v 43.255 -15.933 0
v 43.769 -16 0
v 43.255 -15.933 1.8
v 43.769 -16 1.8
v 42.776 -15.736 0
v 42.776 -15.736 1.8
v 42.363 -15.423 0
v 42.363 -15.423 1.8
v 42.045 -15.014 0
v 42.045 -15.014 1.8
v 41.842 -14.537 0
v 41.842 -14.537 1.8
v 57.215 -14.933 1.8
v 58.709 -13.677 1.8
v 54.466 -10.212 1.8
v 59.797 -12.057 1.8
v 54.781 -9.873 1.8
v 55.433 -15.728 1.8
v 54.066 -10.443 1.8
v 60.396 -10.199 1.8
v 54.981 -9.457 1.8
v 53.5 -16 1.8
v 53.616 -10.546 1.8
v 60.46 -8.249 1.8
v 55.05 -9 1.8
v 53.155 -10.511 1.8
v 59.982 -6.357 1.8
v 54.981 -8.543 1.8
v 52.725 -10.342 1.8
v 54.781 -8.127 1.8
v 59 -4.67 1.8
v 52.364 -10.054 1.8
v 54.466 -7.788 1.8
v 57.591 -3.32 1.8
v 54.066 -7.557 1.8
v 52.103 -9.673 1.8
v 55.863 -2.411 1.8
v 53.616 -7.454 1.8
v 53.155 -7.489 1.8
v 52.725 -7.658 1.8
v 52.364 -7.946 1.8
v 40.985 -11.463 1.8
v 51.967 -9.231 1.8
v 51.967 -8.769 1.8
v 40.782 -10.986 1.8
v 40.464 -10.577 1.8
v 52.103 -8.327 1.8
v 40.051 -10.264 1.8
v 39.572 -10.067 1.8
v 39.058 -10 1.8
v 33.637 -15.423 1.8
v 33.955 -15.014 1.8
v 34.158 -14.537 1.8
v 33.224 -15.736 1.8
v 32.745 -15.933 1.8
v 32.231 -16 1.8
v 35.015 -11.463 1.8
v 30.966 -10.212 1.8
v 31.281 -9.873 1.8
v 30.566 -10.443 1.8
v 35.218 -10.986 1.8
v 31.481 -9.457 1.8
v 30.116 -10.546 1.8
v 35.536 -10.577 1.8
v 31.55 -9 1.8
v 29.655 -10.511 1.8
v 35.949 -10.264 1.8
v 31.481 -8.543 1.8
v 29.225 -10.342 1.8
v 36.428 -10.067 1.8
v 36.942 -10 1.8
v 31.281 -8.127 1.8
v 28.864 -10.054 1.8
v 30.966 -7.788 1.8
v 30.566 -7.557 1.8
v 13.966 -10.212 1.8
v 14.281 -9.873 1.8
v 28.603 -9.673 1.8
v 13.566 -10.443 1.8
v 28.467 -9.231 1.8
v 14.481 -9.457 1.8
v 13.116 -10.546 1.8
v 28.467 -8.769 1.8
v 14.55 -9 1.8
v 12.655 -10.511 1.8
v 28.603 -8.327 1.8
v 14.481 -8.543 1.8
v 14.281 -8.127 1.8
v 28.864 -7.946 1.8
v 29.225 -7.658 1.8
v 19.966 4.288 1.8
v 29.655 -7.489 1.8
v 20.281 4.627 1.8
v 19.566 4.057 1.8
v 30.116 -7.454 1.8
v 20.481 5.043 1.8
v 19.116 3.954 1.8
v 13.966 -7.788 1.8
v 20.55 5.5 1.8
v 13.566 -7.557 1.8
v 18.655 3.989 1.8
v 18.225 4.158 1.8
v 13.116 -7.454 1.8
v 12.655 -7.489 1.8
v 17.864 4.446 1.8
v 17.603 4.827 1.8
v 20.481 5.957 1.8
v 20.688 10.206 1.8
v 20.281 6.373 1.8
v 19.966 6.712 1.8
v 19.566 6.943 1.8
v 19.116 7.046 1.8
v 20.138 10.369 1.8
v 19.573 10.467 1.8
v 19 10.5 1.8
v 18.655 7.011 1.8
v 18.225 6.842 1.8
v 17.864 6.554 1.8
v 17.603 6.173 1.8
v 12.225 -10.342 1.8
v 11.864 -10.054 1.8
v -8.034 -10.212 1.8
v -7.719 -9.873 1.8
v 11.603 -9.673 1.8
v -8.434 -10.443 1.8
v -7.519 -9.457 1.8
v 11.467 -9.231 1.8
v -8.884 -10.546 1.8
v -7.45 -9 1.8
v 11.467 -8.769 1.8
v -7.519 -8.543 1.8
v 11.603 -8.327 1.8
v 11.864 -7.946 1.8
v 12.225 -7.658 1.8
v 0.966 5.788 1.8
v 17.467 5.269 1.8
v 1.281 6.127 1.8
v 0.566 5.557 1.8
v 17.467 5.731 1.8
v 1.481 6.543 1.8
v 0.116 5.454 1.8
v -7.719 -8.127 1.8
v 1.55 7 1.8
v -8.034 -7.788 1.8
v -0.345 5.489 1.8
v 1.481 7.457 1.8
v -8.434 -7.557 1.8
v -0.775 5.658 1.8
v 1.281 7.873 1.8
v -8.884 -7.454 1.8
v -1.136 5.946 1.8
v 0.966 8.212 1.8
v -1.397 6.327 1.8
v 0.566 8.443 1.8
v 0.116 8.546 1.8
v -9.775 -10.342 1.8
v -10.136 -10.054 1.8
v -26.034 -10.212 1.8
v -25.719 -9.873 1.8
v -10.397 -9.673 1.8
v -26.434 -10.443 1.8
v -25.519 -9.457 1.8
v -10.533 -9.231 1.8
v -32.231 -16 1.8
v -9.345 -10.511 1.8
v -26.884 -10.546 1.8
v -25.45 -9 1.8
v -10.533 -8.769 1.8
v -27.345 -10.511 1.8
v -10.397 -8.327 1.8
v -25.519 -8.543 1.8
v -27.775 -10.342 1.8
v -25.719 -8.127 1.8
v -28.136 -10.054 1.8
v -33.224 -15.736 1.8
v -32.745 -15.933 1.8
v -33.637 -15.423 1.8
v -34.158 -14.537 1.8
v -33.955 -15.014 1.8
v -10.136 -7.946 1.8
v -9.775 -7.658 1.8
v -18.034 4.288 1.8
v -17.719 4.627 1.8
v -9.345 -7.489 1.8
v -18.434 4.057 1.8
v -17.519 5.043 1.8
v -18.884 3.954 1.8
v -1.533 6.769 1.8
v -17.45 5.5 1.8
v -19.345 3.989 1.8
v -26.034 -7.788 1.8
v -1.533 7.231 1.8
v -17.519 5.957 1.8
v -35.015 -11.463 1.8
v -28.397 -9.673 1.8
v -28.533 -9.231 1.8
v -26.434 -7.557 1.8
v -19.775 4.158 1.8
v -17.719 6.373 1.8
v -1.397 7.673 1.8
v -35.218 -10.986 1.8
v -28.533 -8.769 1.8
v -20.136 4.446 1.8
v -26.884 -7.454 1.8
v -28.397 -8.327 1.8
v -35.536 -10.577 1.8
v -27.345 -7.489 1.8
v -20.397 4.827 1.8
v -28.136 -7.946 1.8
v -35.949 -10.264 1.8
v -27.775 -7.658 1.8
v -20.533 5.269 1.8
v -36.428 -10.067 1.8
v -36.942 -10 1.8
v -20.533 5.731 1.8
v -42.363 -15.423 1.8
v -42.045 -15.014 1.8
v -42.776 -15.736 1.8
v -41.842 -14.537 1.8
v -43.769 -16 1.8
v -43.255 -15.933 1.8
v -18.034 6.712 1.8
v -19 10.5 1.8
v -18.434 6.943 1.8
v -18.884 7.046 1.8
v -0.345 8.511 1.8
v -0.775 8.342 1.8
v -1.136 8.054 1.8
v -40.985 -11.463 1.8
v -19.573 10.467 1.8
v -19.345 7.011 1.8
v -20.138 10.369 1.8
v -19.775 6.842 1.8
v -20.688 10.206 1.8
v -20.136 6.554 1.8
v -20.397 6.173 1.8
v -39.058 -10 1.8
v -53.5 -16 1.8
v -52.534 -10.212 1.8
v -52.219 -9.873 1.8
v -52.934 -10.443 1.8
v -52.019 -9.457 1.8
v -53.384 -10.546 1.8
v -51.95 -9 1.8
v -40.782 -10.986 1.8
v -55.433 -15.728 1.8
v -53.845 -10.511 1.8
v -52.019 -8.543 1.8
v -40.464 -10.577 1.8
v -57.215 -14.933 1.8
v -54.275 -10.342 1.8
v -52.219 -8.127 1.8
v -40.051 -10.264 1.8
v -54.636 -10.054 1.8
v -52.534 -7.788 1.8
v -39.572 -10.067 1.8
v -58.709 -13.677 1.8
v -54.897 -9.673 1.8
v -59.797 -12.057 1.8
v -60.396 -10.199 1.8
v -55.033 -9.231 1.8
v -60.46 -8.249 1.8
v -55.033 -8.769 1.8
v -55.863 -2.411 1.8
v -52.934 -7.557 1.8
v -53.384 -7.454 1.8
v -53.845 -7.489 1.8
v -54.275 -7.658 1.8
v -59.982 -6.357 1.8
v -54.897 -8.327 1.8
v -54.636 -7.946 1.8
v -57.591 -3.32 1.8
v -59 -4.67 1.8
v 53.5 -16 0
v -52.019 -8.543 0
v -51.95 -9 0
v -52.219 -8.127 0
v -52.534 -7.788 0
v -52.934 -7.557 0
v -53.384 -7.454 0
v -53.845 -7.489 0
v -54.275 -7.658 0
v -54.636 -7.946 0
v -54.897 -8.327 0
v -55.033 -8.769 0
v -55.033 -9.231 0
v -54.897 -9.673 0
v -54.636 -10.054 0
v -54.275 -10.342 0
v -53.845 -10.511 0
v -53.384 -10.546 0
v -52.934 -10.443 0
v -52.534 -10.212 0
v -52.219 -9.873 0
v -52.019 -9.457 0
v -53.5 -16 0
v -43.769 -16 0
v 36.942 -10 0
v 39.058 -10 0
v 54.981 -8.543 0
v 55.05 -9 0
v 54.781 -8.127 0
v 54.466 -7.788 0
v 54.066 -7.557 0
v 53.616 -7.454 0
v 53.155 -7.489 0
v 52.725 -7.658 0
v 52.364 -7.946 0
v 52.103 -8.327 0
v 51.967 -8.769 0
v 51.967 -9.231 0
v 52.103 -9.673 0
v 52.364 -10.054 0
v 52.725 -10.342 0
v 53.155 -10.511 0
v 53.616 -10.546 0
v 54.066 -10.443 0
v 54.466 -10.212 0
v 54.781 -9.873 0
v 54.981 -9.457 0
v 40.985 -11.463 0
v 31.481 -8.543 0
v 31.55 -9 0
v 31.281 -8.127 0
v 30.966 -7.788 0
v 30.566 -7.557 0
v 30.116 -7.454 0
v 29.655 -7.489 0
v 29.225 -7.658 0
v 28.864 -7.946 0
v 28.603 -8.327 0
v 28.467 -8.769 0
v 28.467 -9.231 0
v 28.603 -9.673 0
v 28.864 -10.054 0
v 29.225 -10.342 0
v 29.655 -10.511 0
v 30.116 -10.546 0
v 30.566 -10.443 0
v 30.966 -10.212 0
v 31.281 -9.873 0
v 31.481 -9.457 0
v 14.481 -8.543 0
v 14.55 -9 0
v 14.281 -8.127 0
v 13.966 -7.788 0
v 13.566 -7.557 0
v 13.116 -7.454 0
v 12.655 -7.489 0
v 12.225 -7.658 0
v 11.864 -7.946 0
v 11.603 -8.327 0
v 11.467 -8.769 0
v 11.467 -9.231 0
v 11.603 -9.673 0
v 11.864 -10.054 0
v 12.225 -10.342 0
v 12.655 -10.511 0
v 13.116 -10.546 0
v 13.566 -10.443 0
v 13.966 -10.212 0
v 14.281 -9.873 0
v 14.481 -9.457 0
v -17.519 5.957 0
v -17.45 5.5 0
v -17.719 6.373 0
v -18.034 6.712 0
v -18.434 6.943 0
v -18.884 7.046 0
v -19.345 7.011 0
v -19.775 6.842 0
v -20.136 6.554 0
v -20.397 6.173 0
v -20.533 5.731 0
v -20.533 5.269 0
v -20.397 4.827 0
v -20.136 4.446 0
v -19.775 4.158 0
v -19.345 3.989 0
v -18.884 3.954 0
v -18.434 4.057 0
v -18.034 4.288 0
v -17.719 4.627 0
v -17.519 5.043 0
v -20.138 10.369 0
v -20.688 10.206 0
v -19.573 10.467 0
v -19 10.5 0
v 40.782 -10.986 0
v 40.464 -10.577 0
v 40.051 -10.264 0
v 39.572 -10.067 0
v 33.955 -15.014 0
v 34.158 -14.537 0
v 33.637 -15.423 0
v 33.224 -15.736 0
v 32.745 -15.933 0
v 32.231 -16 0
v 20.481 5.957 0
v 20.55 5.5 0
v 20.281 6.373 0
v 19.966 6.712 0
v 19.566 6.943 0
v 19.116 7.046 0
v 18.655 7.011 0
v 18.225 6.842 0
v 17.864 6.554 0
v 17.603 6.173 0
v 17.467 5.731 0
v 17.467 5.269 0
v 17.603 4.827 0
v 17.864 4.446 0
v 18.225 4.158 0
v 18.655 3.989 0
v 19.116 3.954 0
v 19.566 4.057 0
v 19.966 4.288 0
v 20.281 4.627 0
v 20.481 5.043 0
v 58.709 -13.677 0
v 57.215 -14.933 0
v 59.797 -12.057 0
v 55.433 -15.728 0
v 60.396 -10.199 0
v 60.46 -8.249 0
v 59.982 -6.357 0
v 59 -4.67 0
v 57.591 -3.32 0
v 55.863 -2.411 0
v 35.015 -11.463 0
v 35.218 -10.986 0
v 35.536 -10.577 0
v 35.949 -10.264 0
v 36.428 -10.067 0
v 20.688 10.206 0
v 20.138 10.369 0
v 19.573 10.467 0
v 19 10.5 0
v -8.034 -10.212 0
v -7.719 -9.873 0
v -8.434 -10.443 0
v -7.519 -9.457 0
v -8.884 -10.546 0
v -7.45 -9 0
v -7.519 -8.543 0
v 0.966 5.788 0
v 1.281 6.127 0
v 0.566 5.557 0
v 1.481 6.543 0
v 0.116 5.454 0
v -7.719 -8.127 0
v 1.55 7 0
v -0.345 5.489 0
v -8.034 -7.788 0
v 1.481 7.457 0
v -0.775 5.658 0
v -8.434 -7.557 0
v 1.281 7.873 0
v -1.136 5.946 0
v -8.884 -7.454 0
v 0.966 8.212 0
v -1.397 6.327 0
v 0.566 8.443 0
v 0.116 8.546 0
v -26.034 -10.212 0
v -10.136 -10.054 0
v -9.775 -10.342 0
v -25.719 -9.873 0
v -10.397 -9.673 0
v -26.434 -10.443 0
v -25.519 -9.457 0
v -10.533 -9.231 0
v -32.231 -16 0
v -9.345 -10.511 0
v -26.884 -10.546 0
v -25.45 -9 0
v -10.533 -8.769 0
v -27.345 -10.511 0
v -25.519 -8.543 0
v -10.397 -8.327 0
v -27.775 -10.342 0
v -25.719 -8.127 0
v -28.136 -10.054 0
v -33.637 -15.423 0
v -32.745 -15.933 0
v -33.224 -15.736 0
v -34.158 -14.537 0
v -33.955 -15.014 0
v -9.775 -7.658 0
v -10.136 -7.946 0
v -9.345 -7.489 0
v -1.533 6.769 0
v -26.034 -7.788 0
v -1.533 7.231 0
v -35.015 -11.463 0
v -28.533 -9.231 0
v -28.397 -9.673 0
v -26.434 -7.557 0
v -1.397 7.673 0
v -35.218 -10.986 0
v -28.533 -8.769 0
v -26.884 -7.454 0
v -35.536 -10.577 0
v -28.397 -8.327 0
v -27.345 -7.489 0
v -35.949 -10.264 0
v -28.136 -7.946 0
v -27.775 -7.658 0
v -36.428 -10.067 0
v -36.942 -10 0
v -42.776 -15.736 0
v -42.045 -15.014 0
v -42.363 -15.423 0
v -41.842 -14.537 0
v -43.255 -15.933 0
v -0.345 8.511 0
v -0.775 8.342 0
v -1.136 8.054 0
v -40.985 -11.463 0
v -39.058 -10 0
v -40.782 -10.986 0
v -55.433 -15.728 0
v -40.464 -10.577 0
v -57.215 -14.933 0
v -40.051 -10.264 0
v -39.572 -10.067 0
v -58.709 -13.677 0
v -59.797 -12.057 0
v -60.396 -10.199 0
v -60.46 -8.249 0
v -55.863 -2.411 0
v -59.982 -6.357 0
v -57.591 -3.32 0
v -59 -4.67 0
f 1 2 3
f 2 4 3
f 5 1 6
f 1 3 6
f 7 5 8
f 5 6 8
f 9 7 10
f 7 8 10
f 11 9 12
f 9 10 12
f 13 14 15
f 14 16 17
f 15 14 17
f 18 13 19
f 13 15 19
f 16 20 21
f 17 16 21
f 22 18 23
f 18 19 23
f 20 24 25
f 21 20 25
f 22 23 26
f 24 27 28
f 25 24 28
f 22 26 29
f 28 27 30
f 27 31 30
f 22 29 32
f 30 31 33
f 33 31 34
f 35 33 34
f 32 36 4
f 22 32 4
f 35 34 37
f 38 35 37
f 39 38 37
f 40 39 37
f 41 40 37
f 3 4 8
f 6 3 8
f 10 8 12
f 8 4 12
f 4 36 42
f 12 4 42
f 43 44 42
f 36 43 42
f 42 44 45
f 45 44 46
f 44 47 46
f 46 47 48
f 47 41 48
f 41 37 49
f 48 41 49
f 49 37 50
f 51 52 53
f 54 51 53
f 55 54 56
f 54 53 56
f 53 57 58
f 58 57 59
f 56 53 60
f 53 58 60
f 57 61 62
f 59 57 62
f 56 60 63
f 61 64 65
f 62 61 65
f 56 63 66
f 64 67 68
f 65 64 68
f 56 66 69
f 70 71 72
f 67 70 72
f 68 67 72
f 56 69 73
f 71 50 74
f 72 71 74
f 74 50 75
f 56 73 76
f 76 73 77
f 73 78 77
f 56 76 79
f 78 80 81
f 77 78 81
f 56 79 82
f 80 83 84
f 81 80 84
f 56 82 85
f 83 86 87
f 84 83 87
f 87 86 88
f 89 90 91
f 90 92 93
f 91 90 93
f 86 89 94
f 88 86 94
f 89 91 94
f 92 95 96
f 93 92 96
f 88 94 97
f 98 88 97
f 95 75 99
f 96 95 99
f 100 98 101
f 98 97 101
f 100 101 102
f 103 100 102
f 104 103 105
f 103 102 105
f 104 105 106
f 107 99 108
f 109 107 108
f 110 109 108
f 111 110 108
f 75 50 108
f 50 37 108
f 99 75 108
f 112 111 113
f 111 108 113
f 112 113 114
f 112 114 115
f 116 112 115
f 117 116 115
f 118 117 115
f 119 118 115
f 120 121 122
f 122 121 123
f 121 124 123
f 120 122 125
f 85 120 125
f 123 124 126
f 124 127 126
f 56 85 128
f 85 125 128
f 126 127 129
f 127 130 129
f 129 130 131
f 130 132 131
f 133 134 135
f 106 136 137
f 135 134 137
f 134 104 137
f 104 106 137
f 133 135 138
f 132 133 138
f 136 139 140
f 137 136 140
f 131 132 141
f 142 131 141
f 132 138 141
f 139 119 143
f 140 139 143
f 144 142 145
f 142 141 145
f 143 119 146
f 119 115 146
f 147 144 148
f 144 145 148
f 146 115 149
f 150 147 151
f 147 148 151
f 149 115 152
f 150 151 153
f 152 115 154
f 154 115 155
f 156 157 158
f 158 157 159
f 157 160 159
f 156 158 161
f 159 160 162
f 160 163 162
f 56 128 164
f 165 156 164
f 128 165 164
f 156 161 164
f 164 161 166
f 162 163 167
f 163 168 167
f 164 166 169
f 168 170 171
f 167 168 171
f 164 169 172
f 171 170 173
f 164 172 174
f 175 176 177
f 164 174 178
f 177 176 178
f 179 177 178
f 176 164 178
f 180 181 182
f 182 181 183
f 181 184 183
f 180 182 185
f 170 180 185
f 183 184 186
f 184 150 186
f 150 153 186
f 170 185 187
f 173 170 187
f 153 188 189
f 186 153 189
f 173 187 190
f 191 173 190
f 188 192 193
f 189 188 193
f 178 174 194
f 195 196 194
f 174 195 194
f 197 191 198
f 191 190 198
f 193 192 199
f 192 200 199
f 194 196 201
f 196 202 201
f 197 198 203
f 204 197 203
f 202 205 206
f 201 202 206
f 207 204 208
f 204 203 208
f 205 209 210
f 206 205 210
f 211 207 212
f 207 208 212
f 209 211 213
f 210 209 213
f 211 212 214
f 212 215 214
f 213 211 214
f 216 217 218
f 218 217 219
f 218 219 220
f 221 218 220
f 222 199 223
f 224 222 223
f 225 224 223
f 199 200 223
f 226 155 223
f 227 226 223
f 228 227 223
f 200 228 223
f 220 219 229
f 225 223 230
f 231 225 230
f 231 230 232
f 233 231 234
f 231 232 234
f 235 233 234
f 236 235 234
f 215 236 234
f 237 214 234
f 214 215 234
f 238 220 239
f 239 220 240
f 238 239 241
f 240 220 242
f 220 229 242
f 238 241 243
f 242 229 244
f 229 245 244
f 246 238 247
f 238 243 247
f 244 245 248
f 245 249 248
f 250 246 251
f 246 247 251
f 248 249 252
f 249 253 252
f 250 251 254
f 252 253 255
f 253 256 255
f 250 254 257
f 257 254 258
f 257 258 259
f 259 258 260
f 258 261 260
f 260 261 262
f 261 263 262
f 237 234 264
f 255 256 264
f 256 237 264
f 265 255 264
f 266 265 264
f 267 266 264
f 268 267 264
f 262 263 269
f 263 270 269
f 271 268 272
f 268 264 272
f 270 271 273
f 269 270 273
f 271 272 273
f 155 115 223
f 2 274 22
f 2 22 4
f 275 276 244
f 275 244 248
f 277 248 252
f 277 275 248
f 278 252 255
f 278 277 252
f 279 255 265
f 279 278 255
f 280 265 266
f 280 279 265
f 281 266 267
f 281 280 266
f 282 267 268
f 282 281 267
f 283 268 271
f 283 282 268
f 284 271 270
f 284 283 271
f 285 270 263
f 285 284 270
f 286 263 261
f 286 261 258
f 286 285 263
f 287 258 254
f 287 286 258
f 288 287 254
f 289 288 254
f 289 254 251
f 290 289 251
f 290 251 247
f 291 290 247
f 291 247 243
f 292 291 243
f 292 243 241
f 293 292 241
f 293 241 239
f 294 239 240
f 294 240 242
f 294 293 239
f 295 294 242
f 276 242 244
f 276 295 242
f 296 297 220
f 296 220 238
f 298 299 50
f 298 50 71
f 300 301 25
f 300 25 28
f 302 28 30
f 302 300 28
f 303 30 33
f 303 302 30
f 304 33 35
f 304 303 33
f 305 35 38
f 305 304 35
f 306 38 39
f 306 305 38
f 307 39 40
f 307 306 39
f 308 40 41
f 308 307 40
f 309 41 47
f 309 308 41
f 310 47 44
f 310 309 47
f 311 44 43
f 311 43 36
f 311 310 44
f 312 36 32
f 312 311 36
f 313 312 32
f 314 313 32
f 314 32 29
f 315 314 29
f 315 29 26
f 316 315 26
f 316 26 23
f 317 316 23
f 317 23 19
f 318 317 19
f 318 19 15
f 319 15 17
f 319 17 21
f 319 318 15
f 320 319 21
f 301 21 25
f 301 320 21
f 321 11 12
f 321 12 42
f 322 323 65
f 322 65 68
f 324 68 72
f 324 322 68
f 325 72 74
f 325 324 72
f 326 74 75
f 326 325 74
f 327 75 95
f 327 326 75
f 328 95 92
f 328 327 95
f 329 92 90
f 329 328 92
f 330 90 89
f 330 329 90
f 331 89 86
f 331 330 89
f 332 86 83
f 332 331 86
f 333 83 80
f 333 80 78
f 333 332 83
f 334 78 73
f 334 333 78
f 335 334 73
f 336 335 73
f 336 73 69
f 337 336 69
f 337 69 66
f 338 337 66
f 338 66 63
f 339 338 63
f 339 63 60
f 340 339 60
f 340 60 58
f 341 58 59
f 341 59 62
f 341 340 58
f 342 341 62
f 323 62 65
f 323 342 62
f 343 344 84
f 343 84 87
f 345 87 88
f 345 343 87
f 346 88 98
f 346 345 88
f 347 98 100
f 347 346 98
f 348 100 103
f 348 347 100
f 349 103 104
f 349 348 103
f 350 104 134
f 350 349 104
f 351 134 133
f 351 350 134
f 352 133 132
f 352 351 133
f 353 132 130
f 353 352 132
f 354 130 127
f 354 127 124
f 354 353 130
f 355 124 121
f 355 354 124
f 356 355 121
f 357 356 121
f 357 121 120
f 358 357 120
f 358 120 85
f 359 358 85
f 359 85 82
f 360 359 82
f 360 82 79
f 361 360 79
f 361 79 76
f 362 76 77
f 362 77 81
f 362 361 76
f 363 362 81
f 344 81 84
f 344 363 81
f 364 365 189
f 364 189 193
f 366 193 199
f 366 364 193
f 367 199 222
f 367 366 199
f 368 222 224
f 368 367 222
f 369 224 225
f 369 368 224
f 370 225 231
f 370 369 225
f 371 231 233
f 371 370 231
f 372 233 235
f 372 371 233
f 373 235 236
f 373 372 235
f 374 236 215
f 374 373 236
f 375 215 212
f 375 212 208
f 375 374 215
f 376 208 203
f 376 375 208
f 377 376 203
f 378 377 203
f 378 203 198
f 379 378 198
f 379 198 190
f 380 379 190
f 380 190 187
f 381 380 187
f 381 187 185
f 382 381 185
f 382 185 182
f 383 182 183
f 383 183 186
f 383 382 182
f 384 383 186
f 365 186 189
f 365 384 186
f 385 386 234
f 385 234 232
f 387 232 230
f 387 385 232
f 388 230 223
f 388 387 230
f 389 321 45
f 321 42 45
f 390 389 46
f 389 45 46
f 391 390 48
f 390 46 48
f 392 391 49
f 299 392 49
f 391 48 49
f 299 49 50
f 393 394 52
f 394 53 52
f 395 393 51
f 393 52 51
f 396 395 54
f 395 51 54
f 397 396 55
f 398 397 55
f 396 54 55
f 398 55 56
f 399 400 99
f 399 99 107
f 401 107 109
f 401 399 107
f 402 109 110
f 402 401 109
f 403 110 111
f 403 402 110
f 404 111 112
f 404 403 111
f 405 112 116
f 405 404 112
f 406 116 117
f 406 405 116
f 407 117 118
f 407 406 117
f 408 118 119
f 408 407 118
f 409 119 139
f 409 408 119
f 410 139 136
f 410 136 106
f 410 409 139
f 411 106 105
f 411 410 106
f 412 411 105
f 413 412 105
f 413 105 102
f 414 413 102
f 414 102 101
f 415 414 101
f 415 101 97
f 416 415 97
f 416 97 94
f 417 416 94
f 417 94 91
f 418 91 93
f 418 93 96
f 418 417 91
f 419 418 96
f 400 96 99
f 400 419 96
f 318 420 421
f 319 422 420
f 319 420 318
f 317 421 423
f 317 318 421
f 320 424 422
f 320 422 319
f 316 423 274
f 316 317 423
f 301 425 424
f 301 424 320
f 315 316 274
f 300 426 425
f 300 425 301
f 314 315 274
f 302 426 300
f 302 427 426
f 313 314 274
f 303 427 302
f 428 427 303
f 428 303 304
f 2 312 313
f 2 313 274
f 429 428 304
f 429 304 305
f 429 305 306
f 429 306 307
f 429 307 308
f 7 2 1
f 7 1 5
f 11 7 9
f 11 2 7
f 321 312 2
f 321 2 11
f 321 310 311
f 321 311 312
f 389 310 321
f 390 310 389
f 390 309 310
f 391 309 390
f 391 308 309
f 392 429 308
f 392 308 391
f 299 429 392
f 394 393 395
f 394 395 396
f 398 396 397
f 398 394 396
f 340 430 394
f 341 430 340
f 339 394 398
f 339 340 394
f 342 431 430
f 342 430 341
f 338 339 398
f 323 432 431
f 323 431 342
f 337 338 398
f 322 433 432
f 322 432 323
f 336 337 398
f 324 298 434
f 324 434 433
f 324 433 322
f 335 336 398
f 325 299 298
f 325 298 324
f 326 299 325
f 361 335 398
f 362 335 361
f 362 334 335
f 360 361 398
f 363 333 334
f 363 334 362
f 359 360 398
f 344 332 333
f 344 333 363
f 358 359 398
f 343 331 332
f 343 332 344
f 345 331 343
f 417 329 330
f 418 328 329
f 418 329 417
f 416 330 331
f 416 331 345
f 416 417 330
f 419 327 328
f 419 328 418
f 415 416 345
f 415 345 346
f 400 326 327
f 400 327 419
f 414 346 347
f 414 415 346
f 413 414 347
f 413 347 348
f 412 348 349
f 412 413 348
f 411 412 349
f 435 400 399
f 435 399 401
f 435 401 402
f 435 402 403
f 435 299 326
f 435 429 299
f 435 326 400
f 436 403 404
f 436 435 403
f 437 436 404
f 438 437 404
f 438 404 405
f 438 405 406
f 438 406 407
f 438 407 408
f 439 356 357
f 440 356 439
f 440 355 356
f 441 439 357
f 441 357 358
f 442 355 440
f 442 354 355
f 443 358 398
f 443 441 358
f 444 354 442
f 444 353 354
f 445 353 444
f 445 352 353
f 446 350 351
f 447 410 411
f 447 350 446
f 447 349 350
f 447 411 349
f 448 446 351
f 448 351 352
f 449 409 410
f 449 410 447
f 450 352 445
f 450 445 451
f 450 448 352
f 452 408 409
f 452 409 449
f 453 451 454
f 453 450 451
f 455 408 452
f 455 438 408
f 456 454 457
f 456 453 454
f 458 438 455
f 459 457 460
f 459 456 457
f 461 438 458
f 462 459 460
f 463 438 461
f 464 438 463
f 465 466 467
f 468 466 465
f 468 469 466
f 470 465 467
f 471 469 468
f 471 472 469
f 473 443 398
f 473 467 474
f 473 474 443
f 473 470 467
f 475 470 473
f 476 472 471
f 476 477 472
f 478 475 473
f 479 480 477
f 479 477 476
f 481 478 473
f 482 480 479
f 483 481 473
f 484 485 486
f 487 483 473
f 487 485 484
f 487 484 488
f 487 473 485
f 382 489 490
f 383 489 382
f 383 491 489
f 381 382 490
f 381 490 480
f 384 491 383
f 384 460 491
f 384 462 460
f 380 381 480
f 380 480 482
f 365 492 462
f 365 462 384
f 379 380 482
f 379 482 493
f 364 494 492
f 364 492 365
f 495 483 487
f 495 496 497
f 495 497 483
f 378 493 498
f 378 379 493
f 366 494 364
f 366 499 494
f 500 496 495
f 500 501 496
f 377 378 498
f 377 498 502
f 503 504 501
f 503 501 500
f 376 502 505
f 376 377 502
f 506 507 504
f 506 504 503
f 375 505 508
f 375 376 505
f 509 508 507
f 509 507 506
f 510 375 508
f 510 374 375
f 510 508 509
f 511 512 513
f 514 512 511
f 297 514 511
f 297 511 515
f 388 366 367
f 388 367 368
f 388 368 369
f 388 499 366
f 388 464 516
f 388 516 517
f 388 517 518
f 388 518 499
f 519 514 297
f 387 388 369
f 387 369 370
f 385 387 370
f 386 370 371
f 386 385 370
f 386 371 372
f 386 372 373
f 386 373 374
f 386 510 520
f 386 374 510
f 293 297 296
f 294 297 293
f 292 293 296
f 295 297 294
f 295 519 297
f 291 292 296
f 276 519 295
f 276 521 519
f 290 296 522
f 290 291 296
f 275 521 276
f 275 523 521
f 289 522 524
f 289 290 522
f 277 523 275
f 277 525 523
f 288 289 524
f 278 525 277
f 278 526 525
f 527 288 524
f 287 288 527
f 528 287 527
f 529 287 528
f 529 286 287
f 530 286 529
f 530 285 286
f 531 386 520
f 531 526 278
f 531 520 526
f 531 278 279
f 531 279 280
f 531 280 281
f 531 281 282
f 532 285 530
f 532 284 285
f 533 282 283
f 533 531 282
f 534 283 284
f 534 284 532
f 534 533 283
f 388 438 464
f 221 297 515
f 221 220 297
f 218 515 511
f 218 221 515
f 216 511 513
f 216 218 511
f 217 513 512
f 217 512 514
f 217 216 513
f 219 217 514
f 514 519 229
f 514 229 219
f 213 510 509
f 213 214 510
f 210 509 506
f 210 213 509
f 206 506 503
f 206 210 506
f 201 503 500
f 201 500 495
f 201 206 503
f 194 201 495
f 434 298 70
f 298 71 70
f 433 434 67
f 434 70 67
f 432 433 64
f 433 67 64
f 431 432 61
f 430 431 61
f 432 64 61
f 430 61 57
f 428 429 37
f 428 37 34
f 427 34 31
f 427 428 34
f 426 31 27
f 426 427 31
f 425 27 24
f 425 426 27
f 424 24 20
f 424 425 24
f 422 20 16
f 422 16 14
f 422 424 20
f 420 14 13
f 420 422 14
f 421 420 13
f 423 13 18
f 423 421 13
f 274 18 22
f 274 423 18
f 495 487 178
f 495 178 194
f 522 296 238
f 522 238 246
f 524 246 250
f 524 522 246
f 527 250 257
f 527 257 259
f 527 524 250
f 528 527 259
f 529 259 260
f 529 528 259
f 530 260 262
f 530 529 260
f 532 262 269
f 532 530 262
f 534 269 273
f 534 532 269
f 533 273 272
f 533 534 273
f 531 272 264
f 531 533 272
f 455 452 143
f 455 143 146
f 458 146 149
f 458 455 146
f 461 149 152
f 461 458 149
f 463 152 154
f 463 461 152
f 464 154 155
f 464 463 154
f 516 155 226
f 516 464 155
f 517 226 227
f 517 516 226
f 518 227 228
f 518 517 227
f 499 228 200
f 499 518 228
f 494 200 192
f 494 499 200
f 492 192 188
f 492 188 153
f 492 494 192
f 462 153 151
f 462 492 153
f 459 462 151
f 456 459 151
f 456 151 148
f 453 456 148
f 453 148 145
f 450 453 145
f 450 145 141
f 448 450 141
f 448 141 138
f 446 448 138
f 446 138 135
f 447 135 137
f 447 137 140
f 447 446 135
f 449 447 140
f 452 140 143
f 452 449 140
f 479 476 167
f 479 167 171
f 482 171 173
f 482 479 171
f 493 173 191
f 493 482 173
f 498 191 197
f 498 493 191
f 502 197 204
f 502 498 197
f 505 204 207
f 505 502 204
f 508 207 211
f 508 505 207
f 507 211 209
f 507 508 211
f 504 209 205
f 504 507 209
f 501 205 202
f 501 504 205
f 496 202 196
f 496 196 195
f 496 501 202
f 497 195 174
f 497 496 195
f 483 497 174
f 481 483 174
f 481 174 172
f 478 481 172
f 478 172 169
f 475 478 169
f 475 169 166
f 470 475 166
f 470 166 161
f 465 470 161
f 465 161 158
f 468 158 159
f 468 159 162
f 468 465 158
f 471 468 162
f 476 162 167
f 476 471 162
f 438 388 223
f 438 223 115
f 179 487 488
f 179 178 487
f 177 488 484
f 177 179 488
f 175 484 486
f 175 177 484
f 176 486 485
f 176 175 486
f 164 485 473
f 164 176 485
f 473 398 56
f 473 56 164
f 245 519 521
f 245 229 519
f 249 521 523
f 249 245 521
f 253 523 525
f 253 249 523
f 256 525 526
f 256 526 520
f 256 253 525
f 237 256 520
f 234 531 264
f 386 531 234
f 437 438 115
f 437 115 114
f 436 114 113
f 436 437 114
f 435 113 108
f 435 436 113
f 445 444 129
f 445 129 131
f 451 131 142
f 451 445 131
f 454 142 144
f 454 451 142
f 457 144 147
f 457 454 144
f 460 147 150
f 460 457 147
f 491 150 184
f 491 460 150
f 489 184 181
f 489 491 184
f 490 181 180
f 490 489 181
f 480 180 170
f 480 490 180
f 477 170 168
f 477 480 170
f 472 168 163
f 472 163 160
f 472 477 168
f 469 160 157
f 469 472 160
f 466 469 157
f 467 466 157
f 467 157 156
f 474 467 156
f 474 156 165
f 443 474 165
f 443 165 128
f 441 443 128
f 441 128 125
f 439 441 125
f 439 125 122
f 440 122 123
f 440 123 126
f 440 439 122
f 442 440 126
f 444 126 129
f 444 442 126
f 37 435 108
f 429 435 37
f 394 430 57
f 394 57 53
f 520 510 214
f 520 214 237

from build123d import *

# Parameters (mm, degrees)
SKETCH_1_R      = 1.55
EXTRUDE_1_DEPTH = 1.8
FILLET_1_R      = 2


with BuildPart() as part:
    # 草图1 → 凸台-拉伸1 (new body)
    with BuildSketch(Plane.XY):
        with BuildLine():
            Line((-19, 10.5), (19, 10.5))
            ThreePointArc((19, 10.5), (19.856766341, 10.426048258), (20.688188937, 10.206380575))
            Line((20.688188937, 10.206380575), (55.863464512, -2.411067196))
            ThreePointArc((55.863464512, -2.411067196), (60.396467561, -10.199472878), (53.5, -16))
            Line((53.5, -16), (42.25, -16))
            Line((42.25, -16), (40.57664504, -10))
            Line((40.57664504, -10), (35.42335496, -10))
            Line((35.42335496, -10), (33.75, -16))
            Line((33.75, -16), (-33.75, -16))
            Line((-33.75, -16), (-35.42335496, -10))
            Line((-35.42335496, -10), (-40.57664504, -10))
            Line((-40.57664504, -10), (-42.25, -16))
            Line((-42.25, -16), (-53.5, -16))
            ThreePointArc((-53.5, -16), (-60.396467561, -10.199472878), (-55.863464512, -2.411067196))
            Line((-55.863464512, -2.411067196), (-20.688188937, 10.206380575))
            ThreePointArc((-20.688188937, 10.206380575), (-19.856766341, 10.426048258), (-19, 10.5))
        make_face()
        with Locations((-27, -9)):
            Circle(SKETCH_1_R, mode=Mode.SUBTRACT)
        with Locations((-9, -9)):
            Circle(SKETCH_1_R, mode=Mode.SUBTRACT)
        with Locations((13, -9)):
            Circle(SKETCH_1_R, mode=Mode.SUBTRACT)
        with Locations((30, -9)):
            Circle(SKETCH_1_R, mode=Mode.SUBTRACT)
        with Locations((0, 7)):
            Circle(SKETCH_1_R, mode=Mode.SUBTRACT)
        with Locations((-53.5, -9)):
            Circle(SKETCH_1_R, mode=Mode.SUBTRACT)
        with Locations((53.5, -9)):
            Circle(SKETCH_1_R, mode=Mode.SUBTRACT)
        with Locations((-19, 5.5)):
            Circle(SKETCH_1_R, mode=Mode.SUBTRACT)
        with Locations((19, 5.5)):
            Circle(SKETCH_1_R, mode=Mode.SUBTRACT)
    extrude(amount=EXTRUDE_1_DEPTH)

    # 圆角1
    fillet_1_edges = [part.edges().sort_by_distance(p)[0] for p in [
        (42.25, -16, 0.9),
        (40.57664504, -10, 0.9),
        (35.42335496, -10, 0.9),
        (33.75, -16, 0.9),
        (-33.75, -16, 0.9),
        (-35.42335496, -10, 0.9),
        (-40.57664504, -10, 0.9),
        (-42.25, -16, 0.9),
    ]]
    fillet(fillet_1_edges, radius=FILLET_1_R)


solid = part.part
